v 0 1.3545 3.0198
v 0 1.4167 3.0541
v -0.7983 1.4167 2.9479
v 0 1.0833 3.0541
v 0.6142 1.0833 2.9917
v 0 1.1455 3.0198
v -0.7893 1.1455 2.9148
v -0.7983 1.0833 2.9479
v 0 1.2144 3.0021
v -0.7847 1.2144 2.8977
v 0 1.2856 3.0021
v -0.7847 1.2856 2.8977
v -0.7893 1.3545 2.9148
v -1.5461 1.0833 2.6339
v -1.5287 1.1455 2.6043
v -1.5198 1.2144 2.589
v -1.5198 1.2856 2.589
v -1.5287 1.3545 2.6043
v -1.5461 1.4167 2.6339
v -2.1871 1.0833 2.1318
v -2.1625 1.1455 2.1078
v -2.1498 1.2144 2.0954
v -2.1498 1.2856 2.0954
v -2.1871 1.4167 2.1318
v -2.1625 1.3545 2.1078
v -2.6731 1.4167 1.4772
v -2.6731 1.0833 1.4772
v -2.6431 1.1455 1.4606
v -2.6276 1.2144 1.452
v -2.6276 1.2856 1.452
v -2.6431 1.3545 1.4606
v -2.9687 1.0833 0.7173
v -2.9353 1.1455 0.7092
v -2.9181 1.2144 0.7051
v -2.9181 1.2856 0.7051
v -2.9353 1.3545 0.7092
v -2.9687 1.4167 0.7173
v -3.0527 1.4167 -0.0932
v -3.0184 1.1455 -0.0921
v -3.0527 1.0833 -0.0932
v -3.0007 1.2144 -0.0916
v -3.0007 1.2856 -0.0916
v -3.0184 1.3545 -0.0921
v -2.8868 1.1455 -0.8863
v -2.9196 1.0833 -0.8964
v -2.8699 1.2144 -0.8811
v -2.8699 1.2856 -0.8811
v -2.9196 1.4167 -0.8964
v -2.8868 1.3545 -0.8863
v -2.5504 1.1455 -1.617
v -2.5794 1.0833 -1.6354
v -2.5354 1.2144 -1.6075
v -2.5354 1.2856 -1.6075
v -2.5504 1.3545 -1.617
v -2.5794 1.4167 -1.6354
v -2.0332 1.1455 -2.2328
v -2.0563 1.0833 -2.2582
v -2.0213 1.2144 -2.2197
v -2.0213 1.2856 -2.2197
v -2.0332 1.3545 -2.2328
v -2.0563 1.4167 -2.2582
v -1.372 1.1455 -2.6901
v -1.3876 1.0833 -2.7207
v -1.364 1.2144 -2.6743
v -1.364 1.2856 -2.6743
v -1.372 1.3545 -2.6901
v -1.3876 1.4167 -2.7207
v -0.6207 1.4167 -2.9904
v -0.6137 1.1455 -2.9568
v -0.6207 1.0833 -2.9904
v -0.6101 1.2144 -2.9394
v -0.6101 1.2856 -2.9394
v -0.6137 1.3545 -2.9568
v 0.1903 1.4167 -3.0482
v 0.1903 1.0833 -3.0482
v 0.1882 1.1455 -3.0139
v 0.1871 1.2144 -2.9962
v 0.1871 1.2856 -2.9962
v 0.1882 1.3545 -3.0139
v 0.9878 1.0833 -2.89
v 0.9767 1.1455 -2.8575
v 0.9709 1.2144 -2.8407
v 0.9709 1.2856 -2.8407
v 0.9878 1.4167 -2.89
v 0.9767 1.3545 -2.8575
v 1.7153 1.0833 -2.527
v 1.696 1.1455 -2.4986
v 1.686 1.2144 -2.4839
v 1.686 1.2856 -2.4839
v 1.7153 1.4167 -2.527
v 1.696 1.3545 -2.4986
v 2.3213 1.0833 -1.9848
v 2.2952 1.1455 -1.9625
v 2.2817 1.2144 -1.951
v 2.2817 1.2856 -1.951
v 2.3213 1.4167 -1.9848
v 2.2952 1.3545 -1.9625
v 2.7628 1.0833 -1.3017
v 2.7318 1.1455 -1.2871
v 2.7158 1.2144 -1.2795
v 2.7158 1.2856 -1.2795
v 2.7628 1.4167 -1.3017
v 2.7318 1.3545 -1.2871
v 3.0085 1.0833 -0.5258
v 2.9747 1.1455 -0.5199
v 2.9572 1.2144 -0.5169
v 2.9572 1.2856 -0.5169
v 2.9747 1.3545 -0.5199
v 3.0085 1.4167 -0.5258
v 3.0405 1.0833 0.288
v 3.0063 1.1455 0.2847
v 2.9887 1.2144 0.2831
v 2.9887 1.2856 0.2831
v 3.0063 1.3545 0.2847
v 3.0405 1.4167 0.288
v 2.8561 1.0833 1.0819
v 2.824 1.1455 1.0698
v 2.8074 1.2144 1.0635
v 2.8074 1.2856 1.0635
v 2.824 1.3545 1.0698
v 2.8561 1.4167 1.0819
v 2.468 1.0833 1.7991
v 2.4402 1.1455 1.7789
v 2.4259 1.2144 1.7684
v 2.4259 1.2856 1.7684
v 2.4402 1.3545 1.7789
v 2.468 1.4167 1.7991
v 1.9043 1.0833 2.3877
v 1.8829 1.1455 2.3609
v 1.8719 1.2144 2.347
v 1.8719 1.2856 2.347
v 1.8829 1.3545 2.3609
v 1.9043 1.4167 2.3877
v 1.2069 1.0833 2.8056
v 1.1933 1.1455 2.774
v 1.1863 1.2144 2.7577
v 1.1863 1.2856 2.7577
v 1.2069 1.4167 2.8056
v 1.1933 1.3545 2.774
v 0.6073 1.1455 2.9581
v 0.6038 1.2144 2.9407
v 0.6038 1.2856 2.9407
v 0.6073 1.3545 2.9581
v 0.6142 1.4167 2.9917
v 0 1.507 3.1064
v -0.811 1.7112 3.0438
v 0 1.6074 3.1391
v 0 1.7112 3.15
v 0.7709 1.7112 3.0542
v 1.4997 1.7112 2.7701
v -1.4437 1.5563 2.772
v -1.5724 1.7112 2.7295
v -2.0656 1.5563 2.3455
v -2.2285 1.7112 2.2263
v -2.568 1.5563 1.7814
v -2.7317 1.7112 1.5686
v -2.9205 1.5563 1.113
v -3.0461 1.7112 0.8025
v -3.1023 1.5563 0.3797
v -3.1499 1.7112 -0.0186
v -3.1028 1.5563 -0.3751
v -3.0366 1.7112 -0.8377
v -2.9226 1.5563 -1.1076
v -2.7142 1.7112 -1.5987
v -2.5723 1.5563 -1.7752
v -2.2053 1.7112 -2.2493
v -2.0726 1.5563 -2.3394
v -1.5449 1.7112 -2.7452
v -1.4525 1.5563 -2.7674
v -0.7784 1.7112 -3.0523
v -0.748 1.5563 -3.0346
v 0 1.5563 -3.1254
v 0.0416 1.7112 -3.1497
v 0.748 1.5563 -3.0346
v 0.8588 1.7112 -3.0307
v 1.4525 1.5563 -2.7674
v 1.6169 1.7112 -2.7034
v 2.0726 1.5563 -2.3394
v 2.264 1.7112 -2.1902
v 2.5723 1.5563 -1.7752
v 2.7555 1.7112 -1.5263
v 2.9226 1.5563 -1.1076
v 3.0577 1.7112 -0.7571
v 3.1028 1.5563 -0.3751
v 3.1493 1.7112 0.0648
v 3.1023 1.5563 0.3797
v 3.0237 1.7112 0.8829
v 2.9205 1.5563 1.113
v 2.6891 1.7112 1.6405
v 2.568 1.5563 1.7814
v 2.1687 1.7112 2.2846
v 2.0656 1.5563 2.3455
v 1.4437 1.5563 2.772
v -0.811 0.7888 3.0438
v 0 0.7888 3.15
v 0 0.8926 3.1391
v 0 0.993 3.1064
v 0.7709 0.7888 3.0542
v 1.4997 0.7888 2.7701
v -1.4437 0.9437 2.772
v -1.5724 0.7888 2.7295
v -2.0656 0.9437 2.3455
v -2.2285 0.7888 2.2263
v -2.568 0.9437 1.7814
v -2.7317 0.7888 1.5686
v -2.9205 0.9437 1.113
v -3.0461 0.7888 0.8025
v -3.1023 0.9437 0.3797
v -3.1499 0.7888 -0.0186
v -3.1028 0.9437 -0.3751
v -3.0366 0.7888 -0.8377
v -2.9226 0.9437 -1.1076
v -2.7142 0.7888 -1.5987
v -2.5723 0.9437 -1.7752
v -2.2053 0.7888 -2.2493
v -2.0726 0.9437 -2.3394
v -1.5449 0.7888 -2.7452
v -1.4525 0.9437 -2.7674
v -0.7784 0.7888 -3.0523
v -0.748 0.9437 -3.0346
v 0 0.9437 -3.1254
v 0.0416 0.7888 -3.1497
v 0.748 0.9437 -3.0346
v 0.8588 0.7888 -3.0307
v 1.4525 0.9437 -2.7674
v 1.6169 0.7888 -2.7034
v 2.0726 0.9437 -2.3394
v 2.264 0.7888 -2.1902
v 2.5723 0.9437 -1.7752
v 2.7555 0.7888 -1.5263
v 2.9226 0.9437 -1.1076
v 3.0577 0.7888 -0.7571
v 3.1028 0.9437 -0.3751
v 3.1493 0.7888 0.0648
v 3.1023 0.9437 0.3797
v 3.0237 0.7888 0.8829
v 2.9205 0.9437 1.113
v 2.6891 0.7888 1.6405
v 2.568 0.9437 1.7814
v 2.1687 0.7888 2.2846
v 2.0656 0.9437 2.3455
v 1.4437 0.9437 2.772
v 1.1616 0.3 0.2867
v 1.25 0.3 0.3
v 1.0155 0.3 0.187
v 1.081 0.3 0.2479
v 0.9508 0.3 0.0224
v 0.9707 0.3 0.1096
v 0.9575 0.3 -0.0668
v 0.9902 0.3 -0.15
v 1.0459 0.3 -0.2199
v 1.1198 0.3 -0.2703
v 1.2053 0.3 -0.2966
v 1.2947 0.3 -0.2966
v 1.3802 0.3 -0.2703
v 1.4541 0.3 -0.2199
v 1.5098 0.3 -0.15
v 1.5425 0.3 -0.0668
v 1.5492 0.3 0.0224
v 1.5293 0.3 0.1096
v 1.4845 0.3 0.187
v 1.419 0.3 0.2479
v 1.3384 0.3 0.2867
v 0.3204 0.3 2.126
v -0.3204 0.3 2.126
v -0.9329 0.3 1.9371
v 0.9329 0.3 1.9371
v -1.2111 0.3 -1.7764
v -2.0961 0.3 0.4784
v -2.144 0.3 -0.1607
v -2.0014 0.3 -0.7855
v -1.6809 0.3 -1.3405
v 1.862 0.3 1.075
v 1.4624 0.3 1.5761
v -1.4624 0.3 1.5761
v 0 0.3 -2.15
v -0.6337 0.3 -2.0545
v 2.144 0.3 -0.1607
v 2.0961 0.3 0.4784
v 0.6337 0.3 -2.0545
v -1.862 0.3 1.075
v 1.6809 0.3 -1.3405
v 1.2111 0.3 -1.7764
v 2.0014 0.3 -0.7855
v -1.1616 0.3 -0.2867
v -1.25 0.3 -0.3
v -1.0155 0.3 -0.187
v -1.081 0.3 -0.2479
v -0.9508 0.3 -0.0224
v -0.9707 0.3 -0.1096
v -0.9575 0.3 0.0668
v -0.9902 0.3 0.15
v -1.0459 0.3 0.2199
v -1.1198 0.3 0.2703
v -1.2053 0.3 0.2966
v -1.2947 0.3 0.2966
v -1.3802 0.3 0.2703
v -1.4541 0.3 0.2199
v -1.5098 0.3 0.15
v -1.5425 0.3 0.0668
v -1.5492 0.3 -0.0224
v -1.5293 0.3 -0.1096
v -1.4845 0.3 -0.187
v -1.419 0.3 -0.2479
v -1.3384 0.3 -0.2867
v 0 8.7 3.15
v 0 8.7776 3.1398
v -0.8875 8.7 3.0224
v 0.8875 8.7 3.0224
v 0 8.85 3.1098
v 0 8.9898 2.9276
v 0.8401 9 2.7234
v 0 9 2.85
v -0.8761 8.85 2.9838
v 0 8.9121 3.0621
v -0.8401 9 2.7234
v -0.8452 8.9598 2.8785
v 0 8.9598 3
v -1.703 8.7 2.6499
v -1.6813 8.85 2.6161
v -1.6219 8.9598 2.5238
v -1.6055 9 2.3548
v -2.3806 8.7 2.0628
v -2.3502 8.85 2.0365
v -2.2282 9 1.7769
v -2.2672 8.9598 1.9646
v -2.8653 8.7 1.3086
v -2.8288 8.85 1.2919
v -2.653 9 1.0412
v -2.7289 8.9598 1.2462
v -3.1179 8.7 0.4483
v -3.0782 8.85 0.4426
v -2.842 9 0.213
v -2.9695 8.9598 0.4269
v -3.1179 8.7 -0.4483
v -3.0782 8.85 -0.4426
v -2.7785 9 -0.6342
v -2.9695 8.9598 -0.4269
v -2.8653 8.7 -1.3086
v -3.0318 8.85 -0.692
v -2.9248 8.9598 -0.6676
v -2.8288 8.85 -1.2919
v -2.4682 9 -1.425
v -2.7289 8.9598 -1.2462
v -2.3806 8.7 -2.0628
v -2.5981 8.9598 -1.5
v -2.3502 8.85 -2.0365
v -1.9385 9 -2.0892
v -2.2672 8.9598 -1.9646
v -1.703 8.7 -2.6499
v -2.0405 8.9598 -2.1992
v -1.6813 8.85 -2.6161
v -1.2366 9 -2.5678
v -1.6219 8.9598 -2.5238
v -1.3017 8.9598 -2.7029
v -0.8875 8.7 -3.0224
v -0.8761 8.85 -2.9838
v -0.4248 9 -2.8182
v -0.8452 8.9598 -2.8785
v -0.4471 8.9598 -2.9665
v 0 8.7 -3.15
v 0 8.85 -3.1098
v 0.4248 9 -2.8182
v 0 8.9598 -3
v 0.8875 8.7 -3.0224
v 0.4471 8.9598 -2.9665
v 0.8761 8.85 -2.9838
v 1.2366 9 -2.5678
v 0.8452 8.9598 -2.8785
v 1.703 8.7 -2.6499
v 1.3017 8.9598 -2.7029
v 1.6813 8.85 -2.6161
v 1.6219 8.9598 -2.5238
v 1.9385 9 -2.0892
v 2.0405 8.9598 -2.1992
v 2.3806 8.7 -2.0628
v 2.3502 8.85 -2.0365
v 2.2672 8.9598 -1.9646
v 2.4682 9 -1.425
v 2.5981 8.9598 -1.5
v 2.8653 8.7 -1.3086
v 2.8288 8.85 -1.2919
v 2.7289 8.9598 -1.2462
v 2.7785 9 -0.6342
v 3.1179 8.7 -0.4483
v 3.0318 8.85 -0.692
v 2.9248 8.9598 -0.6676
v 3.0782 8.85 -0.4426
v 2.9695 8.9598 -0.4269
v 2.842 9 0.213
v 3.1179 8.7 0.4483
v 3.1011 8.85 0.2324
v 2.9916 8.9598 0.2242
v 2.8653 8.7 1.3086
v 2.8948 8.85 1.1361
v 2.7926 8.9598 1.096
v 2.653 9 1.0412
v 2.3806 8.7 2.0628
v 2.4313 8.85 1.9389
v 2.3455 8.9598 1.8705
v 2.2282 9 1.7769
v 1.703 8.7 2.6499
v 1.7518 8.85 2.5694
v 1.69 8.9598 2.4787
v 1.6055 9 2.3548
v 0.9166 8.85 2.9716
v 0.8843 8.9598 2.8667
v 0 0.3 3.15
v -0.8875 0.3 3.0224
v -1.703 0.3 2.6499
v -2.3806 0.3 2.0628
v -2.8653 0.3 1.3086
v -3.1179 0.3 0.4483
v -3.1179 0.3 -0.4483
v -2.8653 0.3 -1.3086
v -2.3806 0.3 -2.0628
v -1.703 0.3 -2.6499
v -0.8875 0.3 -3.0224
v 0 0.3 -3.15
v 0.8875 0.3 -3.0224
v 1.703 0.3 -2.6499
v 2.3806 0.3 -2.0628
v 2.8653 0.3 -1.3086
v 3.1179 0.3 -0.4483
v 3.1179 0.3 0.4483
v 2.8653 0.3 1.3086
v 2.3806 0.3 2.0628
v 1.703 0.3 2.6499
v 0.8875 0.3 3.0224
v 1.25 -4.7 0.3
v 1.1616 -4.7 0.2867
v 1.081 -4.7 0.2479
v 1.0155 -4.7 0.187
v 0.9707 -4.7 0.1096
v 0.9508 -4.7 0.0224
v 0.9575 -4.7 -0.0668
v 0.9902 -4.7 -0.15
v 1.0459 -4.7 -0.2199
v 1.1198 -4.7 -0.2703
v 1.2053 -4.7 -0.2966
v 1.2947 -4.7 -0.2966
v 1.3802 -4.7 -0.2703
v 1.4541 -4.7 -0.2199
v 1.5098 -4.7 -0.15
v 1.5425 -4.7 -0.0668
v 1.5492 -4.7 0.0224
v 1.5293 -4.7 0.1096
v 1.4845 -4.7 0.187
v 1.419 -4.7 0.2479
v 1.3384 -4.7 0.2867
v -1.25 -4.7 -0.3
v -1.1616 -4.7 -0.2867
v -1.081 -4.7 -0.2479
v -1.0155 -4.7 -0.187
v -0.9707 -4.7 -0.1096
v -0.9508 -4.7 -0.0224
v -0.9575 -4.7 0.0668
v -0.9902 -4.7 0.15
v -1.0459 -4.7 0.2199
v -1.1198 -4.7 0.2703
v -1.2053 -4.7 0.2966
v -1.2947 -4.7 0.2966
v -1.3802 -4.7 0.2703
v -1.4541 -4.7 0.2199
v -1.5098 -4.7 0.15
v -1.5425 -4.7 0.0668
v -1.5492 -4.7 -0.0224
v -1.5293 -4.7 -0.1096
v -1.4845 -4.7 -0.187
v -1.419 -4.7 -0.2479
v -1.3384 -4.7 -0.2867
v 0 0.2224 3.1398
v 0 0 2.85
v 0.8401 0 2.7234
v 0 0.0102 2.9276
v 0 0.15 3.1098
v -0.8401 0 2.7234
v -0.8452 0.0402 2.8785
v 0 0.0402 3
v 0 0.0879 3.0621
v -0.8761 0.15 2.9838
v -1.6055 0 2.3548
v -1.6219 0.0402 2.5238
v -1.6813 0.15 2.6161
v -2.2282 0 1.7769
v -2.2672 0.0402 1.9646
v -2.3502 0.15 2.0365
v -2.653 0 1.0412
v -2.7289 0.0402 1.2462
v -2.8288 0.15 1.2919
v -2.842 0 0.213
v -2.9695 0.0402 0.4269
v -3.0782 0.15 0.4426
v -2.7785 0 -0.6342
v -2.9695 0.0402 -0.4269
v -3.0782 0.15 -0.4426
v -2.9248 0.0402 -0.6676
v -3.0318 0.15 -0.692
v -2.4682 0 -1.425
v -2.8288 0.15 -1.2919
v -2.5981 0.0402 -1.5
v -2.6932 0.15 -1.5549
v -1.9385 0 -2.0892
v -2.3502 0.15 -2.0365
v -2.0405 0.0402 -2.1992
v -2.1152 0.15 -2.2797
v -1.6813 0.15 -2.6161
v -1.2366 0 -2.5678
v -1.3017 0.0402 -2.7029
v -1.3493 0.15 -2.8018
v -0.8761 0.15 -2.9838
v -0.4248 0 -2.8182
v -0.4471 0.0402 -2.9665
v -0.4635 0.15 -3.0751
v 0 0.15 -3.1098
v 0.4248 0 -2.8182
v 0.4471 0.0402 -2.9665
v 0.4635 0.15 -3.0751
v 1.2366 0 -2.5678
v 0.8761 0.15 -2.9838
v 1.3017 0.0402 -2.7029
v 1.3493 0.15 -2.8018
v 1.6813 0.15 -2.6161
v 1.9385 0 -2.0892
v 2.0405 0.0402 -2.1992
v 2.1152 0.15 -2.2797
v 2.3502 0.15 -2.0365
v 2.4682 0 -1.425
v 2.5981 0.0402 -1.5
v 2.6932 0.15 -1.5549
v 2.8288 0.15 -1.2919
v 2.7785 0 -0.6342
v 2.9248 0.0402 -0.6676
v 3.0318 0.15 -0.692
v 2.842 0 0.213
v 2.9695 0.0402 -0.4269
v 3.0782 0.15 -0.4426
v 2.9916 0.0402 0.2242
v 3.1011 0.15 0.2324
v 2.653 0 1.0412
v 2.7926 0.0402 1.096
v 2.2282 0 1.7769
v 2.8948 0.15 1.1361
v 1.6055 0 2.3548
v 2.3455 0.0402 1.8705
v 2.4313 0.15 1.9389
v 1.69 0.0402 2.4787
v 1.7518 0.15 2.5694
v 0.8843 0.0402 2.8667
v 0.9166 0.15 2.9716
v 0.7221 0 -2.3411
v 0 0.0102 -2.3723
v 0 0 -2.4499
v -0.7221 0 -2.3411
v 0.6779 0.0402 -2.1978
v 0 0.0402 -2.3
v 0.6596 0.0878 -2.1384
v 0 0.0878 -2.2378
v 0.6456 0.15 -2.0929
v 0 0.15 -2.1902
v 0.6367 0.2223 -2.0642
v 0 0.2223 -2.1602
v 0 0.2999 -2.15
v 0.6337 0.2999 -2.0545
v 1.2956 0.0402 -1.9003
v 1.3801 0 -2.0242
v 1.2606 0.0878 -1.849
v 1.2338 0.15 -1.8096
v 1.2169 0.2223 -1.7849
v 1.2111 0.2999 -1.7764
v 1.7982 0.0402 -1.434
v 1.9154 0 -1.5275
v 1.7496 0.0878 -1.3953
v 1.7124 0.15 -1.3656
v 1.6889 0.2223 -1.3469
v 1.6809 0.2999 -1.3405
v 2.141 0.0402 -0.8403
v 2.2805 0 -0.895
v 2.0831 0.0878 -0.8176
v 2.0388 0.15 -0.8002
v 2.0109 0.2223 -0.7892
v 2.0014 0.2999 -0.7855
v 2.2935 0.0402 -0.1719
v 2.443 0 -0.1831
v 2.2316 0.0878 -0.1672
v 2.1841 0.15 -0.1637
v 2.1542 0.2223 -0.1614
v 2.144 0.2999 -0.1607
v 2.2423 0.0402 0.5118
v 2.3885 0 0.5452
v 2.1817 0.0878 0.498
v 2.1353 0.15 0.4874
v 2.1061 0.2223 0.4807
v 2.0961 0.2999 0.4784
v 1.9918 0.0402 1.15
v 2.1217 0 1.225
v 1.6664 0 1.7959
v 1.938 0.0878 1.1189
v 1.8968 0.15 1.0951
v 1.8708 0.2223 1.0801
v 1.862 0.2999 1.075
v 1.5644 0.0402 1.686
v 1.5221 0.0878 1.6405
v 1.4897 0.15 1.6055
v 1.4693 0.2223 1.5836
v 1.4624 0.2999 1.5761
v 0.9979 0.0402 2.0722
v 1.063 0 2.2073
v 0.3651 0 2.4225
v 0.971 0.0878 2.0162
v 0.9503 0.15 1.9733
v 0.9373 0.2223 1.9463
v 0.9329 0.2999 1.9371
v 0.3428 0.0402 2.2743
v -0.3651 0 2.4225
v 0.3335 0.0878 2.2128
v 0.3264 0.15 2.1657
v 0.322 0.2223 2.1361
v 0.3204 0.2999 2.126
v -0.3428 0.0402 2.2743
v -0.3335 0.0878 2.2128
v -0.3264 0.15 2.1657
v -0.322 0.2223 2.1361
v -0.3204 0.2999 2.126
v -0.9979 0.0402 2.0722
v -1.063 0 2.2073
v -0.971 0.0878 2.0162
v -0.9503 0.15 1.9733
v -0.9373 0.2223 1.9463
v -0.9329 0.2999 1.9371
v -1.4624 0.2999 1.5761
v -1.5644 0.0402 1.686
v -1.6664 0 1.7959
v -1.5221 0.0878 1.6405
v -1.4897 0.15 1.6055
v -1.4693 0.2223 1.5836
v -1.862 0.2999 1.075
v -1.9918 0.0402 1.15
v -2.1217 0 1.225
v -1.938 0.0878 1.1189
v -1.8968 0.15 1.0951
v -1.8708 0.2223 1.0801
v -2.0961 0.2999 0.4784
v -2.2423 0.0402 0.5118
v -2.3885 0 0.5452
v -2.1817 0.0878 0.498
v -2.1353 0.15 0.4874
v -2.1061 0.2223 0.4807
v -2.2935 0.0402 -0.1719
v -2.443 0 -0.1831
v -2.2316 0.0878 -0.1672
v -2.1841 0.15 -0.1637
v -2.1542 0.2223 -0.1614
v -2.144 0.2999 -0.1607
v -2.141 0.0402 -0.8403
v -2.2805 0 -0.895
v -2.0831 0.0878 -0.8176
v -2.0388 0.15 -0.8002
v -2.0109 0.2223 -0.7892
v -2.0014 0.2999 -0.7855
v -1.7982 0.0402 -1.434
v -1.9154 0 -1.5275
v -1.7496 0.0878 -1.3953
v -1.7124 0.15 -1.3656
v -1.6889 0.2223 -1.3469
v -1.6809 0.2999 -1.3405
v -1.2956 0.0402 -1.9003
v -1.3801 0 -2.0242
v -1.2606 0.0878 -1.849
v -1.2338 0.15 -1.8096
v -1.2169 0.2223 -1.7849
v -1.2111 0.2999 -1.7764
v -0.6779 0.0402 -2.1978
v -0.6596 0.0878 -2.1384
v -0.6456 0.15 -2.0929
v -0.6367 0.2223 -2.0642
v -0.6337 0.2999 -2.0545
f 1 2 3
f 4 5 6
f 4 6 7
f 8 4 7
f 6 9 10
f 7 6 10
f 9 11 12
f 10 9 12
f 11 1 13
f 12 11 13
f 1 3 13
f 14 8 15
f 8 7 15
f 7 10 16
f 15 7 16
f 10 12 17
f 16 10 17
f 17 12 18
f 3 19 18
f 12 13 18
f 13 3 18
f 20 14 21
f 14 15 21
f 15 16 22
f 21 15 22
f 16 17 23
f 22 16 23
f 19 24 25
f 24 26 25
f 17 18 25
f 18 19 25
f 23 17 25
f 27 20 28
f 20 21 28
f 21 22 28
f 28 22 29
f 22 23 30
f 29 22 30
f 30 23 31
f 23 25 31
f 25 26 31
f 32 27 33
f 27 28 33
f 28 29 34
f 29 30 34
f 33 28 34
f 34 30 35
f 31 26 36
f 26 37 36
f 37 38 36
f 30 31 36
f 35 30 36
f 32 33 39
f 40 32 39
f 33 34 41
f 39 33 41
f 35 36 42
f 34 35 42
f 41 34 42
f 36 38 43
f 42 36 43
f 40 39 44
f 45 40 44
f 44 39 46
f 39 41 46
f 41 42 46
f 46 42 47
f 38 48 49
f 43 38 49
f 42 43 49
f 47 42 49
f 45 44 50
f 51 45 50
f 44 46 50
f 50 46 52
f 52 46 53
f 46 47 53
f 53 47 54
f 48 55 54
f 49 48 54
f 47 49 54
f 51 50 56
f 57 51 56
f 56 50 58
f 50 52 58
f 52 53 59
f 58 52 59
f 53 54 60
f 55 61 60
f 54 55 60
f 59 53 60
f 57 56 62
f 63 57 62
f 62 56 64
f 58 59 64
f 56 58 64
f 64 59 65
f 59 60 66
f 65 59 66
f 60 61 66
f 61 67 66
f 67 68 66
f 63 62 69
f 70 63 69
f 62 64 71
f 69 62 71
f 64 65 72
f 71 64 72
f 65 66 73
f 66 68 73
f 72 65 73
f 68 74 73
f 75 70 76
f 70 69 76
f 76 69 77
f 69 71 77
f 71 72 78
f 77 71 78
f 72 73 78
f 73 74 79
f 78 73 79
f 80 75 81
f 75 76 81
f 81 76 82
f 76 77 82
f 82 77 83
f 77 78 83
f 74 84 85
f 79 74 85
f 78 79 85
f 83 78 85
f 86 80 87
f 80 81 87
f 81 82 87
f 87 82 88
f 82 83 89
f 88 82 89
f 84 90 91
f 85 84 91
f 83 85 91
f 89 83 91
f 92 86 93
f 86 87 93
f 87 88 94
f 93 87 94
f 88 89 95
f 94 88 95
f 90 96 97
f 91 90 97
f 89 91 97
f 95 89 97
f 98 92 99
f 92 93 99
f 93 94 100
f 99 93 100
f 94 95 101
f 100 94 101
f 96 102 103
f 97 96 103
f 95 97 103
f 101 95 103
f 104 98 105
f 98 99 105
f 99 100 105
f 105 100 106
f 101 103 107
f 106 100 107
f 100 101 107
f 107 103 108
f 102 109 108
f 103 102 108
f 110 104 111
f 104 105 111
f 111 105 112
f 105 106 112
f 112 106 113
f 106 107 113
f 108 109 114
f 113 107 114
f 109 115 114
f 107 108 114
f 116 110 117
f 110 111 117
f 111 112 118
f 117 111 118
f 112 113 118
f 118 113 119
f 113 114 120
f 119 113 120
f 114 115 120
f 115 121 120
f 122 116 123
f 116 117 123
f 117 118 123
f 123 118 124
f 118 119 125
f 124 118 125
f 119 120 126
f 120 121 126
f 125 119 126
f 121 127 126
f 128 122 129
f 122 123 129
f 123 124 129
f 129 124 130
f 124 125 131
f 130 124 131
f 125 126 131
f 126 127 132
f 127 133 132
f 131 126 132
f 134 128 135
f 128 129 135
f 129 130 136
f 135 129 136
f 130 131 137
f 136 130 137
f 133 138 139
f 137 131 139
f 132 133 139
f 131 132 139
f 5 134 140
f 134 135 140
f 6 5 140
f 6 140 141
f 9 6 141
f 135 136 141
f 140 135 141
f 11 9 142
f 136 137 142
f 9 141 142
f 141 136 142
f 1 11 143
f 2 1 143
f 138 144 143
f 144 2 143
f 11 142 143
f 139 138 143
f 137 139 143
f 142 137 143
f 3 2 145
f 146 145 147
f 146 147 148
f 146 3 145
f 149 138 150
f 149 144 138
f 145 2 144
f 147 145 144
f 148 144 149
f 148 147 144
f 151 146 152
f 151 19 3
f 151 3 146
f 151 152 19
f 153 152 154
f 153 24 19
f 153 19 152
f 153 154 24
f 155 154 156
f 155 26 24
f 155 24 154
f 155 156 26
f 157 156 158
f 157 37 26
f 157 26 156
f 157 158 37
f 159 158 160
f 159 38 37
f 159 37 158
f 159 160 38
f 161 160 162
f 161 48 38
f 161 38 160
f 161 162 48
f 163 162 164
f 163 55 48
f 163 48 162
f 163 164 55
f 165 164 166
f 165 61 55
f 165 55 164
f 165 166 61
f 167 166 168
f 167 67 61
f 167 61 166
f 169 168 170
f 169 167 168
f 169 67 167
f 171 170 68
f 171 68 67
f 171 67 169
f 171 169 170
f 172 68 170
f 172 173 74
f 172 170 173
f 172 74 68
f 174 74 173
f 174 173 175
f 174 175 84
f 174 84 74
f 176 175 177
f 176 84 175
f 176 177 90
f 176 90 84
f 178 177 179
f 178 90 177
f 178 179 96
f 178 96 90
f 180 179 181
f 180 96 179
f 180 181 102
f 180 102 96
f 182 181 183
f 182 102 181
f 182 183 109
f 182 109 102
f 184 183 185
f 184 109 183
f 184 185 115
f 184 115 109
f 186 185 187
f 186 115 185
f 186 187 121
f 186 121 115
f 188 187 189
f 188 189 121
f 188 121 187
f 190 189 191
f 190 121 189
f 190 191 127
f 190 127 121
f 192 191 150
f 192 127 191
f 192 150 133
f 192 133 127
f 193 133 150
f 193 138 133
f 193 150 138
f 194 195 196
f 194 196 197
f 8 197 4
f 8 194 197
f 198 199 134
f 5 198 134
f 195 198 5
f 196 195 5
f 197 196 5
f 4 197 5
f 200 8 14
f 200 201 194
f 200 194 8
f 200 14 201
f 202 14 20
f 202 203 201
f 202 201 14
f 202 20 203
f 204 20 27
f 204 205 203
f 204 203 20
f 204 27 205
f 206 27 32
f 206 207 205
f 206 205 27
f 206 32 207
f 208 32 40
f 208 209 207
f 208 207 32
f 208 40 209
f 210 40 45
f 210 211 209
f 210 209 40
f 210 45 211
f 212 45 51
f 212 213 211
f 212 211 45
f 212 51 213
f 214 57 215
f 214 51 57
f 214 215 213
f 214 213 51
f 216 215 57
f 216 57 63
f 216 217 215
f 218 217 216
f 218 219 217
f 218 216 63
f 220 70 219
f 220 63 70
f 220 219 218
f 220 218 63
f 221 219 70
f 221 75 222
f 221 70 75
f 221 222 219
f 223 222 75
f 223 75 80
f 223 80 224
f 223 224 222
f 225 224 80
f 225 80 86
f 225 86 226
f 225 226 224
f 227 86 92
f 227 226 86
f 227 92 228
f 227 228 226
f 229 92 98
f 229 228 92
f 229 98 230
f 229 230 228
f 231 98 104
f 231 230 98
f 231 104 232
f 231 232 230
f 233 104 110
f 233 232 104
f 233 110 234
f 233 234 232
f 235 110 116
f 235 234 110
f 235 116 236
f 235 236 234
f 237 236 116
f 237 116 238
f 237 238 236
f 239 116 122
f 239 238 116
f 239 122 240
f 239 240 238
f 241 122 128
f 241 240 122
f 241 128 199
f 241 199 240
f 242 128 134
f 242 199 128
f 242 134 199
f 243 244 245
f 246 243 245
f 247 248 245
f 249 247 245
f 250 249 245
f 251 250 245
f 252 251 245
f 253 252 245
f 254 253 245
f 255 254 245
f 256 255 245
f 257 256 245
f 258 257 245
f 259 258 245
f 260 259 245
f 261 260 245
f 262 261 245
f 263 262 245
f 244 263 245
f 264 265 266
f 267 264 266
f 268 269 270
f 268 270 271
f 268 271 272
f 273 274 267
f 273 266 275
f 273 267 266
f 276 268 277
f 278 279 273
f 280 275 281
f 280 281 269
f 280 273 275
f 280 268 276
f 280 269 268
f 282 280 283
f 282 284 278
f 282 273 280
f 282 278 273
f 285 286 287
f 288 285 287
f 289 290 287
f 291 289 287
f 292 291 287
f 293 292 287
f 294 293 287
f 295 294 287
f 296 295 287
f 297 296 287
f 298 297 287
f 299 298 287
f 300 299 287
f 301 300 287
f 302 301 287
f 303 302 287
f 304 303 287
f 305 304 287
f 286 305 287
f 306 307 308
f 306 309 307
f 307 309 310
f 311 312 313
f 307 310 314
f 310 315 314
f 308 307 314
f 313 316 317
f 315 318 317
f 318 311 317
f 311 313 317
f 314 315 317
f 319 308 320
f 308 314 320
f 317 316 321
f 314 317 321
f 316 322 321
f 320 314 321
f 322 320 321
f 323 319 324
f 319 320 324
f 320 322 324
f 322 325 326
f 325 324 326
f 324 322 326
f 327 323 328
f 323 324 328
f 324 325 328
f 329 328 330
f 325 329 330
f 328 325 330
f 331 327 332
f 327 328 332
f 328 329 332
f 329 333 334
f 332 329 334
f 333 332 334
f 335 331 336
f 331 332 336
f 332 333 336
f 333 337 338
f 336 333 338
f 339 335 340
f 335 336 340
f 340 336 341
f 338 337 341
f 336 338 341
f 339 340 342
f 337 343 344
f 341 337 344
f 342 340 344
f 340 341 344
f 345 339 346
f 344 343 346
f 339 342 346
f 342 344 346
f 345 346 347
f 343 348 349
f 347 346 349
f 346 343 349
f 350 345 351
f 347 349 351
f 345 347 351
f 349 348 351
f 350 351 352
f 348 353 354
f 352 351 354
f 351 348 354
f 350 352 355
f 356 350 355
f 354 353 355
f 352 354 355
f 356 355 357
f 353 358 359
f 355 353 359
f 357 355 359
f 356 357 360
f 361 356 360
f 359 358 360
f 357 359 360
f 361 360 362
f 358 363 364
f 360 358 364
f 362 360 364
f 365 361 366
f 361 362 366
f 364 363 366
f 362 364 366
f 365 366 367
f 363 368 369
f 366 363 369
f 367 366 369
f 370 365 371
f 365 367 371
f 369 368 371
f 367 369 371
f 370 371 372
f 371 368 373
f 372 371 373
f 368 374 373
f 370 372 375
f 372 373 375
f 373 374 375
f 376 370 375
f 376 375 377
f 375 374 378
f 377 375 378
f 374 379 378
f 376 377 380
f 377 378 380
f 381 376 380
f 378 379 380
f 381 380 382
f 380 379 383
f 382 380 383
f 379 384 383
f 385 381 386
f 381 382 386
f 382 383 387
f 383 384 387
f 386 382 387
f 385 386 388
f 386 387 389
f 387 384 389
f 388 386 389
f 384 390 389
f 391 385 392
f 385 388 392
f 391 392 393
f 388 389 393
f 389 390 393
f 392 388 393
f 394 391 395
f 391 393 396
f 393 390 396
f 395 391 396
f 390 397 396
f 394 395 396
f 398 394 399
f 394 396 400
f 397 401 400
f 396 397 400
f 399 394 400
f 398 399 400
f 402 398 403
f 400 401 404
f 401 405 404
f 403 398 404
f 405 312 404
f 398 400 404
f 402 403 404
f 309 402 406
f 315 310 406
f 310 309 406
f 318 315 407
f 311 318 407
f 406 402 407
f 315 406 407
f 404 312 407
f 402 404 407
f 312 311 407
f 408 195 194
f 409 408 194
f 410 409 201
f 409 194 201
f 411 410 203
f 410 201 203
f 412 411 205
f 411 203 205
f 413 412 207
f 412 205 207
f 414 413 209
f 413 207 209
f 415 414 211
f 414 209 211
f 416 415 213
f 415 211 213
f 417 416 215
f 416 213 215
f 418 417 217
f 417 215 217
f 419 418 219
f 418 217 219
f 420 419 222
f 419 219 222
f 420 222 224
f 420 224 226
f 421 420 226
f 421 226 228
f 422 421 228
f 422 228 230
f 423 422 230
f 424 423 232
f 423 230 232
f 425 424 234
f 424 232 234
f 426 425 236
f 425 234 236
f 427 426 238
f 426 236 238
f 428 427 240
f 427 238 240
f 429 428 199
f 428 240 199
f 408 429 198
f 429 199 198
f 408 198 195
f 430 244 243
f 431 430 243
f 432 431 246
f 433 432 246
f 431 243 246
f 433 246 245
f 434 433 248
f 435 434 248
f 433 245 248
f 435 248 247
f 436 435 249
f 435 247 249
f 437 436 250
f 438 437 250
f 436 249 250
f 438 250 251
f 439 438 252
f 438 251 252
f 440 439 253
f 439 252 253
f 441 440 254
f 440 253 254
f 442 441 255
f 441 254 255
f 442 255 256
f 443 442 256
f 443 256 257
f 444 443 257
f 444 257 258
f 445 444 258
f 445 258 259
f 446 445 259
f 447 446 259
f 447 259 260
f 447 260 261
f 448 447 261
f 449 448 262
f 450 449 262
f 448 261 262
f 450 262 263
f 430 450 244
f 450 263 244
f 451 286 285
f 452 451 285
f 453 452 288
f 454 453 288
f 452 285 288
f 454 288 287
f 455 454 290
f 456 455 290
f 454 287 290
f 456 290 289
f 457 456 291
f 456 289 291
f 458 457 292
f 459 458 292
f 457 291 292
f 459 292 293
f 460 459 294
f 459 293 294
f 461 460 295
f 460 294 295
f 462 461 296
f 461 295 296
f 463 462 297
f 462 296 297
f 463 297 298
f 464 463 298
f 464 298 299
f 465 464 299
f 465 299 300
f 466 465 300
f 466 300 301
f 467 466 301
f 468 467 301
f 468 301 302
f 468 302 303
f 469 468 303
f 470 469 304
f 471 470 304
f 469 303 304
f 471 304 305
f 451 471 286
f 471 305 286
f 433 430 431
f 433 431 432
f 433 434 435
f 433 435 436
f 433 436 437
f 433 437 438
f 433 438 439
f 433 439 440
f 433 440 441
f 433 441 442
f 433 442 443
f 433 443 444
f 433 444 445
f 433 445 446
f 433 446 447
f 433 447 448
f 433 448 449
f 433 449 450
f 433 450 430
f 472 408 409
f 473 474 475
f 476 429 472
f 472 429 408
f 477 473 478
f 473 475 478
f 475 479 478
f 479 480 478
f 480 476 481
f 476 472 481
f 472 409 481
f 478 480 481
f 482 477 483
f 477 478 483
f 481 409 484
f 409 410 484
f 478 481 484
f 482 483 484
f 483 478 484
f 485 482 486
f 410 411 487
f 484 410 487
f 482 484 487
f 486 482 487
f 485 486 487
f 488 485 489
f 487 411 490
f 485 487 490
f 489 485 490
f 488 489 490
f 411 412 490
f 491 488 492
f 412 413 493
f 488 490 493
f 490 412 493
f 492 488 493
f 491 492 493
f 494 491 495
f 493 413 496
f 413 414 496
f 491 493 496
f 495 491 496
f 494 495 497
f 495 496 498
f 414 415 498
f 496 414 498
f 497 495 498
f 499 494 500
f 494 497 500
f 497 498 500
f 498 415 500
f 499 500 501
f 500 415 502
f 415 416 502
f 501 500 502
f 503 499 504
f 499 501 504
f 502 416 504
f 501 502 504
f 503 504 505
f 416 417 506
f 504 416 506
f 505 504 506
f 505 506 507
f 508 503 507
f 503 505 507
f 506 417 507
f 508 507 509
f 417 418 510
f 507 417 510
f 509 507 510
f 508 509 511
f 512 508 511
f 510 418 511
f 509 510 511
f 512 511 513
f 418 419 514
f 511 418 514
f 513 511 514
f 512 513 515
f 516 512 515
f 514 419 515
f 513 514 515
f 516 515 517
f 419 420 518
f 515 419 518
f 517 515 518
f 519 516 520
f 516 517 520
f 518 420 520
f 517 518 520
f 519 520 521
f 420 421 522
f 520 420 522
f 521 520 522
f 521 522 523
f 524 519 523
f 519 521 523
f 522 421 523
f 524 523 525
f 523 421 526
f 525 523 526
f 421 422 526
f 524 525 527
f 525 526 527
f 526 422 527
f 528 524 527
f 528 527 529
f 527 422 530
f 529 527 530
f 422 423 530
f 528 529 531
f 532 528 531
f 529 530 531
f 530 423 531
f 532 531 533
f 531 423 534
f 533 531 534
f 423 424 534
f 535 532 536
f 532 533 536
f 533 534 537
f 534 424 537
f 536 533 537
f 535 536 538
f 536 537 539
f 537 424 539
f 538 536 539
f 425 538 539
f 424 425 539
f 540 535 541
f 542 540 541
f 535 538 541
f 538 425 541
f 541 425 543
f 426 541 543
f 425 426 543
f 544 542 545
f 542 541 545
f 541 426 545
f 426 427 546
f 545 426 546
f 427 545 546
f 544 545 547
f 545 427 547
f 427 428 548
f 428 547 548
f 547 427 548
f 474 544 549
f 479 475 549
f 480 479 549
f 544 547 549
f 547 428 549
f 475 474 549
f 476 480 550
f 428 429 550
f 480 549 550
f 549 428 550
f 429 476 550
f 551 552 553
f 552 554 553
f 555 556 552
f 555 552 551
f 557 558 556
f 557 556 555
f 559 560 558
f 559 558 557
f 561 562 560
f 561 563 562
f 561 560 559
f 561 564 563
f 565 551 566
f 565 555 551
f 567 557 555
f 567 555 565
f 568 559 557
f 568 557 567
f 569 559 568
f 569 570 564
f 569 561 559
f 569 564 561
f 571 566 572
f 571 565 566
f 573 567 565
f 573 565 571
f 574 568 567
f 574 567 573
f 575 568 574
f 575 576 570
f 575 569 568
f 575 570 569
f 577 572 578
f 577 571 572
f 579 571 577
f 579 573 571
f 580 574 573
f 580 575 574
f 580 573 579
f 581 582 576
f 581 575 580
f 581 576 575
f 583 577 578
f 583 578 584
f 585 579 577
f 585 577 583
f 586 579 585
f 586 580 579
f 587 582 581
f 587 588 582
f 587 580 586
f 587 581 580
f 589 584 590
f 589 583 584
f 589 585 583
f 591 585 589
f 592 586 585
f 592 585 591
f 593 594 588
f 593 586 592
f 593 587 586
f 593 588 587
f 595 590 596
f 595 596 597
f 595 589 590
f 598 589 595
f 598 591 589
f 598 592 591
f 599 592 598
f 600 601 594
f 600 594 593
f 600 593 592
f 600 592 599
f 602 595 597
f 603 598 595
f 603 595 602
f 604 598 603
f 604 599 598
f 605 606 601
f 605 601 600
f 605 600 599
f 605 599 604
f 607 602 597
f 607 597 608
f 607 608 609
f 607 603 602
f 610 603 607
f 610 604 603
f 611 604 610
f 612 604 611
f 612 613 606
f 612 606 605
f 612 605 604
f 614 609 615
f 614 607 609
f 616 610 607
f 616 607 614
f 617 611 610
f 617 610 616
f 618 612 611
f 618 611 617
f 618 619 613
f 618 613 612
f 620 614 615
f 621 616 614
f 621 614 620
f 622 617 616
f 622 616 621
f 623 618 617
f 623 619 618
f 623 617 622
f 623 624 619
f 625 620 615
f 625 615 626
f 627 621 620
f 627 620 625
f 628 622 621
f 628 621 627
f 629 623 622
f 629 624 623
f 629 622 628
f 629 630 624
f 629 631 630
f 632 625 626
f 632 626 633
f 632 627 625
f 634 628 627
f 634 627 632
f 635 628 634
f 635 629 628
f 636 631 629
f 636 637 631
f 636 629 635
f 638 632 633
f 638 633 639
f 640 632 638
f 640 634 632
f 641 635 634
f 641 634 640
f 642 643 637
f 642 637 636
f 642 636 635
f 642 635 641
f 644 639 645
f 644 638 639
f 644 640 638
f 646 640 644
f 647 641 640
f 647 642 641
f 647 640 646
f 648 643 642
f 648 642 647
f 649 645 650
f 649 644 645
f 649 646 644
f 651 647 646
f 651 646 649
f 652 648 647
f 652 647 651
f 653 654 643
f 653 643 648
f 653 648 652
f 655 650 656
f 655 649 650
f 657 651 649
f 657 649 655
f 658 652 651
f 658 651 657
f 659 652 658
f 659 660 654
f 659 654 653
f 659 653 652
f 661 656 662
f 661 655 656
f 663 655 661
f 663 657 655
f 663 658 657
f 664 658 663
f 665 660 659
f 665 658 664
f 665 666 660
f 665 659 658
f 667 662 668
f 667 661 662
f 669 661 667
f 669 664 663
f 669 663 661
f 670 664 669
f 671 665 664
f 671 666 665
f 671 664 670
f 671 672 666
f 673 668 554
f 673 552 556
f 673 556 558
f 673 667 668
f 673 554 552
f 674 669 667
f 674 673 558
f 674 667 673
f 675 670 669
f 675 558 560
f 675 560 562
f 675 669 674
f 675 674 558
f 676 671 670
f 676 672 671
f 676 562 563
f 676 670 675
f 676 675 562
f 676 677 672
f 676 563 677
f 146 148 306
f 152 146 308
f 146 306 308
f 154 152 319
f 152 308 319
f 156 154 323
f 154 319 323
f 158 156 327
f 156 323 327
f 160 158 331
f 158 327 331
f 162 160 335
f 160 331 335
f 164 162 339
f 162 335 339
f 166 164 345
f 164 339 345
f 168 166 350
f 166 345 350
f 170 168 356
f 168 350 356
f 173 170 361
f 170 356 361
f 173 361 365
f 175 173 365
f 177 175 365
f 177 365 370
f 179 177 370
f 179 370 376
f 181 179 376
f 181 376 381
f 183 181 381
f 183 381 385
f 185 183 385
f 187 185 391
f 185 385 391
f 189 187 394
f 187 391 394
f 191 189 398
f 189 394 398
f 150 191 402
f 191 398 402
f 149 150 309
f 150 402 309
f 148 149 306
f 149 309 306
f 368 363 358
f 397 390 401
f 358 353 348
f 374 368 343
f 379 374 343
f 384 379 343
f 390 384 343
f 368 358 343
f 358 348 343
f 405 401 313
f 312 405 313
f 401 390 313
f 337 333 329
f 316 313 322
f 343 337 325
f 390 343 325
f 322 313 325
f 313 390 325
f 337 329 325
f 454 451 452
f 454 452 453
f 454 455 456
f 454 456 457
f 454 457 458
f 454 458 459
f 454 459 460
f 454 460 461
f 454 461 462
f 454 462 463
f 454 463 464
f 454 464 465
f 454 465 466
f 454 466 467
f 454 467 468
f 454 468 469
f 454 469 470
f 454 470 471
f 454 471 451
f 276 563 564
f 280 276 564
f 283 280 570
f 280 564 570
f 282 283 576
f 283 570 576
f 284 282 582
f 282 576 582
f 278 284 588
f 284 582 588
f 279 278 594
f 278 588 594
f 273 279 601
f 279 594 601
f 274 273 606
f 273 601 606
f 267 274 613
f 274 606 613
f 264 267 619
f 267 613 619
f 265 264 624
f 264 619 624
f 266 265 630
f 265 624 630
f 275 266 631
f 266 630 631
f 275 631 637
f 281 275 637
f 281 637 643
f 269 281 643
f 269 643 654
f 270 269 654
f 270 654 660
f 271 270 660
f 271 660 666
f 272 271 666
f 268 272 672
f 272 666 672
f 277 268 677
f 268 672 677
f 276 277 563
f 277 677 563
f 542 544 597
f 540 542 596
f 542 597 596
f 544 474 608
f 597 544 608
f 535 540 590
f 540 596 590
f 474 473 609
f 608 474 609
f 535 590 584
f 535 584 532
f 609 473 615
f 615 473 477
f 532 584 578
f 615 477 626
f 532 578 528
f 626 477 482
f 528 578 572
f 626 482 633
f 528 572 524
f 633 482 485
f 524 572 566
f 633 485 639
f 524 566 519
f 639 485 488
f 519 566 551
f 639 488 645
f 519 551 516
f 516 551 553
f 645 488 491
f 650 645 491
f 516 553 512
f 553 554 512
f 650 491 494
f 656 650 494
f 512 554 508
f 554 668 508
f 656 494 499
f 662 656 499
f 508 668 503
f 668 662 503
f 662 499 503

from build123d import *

# Parameters (mm, degrees)
FILLET_1_R          = 0.5
SKETCH_2_R          = 2.15
CUT_EXTRUDE_1_DEPTH = 0.3
FILLET_2_R          = 0.3
SKETCH_3_R          = 0.3
EXTRUDE_1_DEPTH     = 5
EXTRUDE_1_2_DEPTH   = 5


with BuildPart() as part:
    # Эскиз1 → Повернуть1 (revolve)
    with BuildSketch(Plane(origin=(0, 0, 0), x_dir=(0, 0, -1), z_dir=(1, 0, 0))):
        with BuildLine():
            Line((0, 0), (-2.85, 0))
            ThreePointArc((-2.85, 0), (-3.062132034, 0.087867966), (-3.15, 0.3))
            Line((-3.15, 0.3), (-3.15, 1))
            ThreePointArc((-3.15, 1), (-2.999835492, 1.25), (-3.15, 1.5))
            Line((-3.15, 1.5), (-3.15, 8.7))
            ThreePointArc((-3.15, 8.7), (-3.062132034, 8.912132034), (-2.85, 9))
            Line((-2.85, 9), (0, 9))
            Line((0, 9), (0, 0))
        make_face()
    revolve(axis=Axis((0, 14.239800306, 0), (0, -1, 0)))

    # Скругление1
    fillet_1_edges = [part.edges().sort_by_distance(p)[0] for p in [
        (0, 1.5, -3.15),
        (0, 1, -3.15),
    ]]
    fillet(fillet_1_edges, radius=FILLET_1_R)

    # Эскиз2 → Вырез-Вытянуть1 (cut)
    with BuildSketch(Plane.XZ):
        with Locations(Location((0, 0, 0), (0, 0, 270))):
            Circle(SKETCH_2_R)
    extrude(amount=-CUT_EXTRUDE_1_DEPTH, mode=Mode.SUBTRACT)

    # Скругление2
    fillet_2_edges = [part.edges().sort_by_distance(p)[0] for p in [
        (0, 0, 2.15),
    ]]
    fillet(fillet_2_edges, radius=FILLET_2_R - 0.0001)  # a hair under: the kernel refuses the full size


with BuildPart() as body_2:
    # Эскиз3 → Бобышка-Вытянуть1 (new body)
    with BuildSketch(Plane.XZ.offset(-0.3)):
        with Locations(Location((-1.25, 0, 0), (0, 0, 270))):
            Circle(SKETCH_3_R)
    extrude(amount=EXTRUDE_1_DEPTH)


with BuildPart() as body_3:
    # Эскиз3 → Extrude 1 2 (new body)
    with BuildSketch(Plane.XZ.offset(-0.3)):
        with Locations(Location((1.25, 0, 0), (0, 0, 90))):
            Circle(SKETCH_3_R)
    extrude(amount=EXTRUDE_1_2_DEPTH)


solid = Compound([part.part, body_2.part, body_3.part])
